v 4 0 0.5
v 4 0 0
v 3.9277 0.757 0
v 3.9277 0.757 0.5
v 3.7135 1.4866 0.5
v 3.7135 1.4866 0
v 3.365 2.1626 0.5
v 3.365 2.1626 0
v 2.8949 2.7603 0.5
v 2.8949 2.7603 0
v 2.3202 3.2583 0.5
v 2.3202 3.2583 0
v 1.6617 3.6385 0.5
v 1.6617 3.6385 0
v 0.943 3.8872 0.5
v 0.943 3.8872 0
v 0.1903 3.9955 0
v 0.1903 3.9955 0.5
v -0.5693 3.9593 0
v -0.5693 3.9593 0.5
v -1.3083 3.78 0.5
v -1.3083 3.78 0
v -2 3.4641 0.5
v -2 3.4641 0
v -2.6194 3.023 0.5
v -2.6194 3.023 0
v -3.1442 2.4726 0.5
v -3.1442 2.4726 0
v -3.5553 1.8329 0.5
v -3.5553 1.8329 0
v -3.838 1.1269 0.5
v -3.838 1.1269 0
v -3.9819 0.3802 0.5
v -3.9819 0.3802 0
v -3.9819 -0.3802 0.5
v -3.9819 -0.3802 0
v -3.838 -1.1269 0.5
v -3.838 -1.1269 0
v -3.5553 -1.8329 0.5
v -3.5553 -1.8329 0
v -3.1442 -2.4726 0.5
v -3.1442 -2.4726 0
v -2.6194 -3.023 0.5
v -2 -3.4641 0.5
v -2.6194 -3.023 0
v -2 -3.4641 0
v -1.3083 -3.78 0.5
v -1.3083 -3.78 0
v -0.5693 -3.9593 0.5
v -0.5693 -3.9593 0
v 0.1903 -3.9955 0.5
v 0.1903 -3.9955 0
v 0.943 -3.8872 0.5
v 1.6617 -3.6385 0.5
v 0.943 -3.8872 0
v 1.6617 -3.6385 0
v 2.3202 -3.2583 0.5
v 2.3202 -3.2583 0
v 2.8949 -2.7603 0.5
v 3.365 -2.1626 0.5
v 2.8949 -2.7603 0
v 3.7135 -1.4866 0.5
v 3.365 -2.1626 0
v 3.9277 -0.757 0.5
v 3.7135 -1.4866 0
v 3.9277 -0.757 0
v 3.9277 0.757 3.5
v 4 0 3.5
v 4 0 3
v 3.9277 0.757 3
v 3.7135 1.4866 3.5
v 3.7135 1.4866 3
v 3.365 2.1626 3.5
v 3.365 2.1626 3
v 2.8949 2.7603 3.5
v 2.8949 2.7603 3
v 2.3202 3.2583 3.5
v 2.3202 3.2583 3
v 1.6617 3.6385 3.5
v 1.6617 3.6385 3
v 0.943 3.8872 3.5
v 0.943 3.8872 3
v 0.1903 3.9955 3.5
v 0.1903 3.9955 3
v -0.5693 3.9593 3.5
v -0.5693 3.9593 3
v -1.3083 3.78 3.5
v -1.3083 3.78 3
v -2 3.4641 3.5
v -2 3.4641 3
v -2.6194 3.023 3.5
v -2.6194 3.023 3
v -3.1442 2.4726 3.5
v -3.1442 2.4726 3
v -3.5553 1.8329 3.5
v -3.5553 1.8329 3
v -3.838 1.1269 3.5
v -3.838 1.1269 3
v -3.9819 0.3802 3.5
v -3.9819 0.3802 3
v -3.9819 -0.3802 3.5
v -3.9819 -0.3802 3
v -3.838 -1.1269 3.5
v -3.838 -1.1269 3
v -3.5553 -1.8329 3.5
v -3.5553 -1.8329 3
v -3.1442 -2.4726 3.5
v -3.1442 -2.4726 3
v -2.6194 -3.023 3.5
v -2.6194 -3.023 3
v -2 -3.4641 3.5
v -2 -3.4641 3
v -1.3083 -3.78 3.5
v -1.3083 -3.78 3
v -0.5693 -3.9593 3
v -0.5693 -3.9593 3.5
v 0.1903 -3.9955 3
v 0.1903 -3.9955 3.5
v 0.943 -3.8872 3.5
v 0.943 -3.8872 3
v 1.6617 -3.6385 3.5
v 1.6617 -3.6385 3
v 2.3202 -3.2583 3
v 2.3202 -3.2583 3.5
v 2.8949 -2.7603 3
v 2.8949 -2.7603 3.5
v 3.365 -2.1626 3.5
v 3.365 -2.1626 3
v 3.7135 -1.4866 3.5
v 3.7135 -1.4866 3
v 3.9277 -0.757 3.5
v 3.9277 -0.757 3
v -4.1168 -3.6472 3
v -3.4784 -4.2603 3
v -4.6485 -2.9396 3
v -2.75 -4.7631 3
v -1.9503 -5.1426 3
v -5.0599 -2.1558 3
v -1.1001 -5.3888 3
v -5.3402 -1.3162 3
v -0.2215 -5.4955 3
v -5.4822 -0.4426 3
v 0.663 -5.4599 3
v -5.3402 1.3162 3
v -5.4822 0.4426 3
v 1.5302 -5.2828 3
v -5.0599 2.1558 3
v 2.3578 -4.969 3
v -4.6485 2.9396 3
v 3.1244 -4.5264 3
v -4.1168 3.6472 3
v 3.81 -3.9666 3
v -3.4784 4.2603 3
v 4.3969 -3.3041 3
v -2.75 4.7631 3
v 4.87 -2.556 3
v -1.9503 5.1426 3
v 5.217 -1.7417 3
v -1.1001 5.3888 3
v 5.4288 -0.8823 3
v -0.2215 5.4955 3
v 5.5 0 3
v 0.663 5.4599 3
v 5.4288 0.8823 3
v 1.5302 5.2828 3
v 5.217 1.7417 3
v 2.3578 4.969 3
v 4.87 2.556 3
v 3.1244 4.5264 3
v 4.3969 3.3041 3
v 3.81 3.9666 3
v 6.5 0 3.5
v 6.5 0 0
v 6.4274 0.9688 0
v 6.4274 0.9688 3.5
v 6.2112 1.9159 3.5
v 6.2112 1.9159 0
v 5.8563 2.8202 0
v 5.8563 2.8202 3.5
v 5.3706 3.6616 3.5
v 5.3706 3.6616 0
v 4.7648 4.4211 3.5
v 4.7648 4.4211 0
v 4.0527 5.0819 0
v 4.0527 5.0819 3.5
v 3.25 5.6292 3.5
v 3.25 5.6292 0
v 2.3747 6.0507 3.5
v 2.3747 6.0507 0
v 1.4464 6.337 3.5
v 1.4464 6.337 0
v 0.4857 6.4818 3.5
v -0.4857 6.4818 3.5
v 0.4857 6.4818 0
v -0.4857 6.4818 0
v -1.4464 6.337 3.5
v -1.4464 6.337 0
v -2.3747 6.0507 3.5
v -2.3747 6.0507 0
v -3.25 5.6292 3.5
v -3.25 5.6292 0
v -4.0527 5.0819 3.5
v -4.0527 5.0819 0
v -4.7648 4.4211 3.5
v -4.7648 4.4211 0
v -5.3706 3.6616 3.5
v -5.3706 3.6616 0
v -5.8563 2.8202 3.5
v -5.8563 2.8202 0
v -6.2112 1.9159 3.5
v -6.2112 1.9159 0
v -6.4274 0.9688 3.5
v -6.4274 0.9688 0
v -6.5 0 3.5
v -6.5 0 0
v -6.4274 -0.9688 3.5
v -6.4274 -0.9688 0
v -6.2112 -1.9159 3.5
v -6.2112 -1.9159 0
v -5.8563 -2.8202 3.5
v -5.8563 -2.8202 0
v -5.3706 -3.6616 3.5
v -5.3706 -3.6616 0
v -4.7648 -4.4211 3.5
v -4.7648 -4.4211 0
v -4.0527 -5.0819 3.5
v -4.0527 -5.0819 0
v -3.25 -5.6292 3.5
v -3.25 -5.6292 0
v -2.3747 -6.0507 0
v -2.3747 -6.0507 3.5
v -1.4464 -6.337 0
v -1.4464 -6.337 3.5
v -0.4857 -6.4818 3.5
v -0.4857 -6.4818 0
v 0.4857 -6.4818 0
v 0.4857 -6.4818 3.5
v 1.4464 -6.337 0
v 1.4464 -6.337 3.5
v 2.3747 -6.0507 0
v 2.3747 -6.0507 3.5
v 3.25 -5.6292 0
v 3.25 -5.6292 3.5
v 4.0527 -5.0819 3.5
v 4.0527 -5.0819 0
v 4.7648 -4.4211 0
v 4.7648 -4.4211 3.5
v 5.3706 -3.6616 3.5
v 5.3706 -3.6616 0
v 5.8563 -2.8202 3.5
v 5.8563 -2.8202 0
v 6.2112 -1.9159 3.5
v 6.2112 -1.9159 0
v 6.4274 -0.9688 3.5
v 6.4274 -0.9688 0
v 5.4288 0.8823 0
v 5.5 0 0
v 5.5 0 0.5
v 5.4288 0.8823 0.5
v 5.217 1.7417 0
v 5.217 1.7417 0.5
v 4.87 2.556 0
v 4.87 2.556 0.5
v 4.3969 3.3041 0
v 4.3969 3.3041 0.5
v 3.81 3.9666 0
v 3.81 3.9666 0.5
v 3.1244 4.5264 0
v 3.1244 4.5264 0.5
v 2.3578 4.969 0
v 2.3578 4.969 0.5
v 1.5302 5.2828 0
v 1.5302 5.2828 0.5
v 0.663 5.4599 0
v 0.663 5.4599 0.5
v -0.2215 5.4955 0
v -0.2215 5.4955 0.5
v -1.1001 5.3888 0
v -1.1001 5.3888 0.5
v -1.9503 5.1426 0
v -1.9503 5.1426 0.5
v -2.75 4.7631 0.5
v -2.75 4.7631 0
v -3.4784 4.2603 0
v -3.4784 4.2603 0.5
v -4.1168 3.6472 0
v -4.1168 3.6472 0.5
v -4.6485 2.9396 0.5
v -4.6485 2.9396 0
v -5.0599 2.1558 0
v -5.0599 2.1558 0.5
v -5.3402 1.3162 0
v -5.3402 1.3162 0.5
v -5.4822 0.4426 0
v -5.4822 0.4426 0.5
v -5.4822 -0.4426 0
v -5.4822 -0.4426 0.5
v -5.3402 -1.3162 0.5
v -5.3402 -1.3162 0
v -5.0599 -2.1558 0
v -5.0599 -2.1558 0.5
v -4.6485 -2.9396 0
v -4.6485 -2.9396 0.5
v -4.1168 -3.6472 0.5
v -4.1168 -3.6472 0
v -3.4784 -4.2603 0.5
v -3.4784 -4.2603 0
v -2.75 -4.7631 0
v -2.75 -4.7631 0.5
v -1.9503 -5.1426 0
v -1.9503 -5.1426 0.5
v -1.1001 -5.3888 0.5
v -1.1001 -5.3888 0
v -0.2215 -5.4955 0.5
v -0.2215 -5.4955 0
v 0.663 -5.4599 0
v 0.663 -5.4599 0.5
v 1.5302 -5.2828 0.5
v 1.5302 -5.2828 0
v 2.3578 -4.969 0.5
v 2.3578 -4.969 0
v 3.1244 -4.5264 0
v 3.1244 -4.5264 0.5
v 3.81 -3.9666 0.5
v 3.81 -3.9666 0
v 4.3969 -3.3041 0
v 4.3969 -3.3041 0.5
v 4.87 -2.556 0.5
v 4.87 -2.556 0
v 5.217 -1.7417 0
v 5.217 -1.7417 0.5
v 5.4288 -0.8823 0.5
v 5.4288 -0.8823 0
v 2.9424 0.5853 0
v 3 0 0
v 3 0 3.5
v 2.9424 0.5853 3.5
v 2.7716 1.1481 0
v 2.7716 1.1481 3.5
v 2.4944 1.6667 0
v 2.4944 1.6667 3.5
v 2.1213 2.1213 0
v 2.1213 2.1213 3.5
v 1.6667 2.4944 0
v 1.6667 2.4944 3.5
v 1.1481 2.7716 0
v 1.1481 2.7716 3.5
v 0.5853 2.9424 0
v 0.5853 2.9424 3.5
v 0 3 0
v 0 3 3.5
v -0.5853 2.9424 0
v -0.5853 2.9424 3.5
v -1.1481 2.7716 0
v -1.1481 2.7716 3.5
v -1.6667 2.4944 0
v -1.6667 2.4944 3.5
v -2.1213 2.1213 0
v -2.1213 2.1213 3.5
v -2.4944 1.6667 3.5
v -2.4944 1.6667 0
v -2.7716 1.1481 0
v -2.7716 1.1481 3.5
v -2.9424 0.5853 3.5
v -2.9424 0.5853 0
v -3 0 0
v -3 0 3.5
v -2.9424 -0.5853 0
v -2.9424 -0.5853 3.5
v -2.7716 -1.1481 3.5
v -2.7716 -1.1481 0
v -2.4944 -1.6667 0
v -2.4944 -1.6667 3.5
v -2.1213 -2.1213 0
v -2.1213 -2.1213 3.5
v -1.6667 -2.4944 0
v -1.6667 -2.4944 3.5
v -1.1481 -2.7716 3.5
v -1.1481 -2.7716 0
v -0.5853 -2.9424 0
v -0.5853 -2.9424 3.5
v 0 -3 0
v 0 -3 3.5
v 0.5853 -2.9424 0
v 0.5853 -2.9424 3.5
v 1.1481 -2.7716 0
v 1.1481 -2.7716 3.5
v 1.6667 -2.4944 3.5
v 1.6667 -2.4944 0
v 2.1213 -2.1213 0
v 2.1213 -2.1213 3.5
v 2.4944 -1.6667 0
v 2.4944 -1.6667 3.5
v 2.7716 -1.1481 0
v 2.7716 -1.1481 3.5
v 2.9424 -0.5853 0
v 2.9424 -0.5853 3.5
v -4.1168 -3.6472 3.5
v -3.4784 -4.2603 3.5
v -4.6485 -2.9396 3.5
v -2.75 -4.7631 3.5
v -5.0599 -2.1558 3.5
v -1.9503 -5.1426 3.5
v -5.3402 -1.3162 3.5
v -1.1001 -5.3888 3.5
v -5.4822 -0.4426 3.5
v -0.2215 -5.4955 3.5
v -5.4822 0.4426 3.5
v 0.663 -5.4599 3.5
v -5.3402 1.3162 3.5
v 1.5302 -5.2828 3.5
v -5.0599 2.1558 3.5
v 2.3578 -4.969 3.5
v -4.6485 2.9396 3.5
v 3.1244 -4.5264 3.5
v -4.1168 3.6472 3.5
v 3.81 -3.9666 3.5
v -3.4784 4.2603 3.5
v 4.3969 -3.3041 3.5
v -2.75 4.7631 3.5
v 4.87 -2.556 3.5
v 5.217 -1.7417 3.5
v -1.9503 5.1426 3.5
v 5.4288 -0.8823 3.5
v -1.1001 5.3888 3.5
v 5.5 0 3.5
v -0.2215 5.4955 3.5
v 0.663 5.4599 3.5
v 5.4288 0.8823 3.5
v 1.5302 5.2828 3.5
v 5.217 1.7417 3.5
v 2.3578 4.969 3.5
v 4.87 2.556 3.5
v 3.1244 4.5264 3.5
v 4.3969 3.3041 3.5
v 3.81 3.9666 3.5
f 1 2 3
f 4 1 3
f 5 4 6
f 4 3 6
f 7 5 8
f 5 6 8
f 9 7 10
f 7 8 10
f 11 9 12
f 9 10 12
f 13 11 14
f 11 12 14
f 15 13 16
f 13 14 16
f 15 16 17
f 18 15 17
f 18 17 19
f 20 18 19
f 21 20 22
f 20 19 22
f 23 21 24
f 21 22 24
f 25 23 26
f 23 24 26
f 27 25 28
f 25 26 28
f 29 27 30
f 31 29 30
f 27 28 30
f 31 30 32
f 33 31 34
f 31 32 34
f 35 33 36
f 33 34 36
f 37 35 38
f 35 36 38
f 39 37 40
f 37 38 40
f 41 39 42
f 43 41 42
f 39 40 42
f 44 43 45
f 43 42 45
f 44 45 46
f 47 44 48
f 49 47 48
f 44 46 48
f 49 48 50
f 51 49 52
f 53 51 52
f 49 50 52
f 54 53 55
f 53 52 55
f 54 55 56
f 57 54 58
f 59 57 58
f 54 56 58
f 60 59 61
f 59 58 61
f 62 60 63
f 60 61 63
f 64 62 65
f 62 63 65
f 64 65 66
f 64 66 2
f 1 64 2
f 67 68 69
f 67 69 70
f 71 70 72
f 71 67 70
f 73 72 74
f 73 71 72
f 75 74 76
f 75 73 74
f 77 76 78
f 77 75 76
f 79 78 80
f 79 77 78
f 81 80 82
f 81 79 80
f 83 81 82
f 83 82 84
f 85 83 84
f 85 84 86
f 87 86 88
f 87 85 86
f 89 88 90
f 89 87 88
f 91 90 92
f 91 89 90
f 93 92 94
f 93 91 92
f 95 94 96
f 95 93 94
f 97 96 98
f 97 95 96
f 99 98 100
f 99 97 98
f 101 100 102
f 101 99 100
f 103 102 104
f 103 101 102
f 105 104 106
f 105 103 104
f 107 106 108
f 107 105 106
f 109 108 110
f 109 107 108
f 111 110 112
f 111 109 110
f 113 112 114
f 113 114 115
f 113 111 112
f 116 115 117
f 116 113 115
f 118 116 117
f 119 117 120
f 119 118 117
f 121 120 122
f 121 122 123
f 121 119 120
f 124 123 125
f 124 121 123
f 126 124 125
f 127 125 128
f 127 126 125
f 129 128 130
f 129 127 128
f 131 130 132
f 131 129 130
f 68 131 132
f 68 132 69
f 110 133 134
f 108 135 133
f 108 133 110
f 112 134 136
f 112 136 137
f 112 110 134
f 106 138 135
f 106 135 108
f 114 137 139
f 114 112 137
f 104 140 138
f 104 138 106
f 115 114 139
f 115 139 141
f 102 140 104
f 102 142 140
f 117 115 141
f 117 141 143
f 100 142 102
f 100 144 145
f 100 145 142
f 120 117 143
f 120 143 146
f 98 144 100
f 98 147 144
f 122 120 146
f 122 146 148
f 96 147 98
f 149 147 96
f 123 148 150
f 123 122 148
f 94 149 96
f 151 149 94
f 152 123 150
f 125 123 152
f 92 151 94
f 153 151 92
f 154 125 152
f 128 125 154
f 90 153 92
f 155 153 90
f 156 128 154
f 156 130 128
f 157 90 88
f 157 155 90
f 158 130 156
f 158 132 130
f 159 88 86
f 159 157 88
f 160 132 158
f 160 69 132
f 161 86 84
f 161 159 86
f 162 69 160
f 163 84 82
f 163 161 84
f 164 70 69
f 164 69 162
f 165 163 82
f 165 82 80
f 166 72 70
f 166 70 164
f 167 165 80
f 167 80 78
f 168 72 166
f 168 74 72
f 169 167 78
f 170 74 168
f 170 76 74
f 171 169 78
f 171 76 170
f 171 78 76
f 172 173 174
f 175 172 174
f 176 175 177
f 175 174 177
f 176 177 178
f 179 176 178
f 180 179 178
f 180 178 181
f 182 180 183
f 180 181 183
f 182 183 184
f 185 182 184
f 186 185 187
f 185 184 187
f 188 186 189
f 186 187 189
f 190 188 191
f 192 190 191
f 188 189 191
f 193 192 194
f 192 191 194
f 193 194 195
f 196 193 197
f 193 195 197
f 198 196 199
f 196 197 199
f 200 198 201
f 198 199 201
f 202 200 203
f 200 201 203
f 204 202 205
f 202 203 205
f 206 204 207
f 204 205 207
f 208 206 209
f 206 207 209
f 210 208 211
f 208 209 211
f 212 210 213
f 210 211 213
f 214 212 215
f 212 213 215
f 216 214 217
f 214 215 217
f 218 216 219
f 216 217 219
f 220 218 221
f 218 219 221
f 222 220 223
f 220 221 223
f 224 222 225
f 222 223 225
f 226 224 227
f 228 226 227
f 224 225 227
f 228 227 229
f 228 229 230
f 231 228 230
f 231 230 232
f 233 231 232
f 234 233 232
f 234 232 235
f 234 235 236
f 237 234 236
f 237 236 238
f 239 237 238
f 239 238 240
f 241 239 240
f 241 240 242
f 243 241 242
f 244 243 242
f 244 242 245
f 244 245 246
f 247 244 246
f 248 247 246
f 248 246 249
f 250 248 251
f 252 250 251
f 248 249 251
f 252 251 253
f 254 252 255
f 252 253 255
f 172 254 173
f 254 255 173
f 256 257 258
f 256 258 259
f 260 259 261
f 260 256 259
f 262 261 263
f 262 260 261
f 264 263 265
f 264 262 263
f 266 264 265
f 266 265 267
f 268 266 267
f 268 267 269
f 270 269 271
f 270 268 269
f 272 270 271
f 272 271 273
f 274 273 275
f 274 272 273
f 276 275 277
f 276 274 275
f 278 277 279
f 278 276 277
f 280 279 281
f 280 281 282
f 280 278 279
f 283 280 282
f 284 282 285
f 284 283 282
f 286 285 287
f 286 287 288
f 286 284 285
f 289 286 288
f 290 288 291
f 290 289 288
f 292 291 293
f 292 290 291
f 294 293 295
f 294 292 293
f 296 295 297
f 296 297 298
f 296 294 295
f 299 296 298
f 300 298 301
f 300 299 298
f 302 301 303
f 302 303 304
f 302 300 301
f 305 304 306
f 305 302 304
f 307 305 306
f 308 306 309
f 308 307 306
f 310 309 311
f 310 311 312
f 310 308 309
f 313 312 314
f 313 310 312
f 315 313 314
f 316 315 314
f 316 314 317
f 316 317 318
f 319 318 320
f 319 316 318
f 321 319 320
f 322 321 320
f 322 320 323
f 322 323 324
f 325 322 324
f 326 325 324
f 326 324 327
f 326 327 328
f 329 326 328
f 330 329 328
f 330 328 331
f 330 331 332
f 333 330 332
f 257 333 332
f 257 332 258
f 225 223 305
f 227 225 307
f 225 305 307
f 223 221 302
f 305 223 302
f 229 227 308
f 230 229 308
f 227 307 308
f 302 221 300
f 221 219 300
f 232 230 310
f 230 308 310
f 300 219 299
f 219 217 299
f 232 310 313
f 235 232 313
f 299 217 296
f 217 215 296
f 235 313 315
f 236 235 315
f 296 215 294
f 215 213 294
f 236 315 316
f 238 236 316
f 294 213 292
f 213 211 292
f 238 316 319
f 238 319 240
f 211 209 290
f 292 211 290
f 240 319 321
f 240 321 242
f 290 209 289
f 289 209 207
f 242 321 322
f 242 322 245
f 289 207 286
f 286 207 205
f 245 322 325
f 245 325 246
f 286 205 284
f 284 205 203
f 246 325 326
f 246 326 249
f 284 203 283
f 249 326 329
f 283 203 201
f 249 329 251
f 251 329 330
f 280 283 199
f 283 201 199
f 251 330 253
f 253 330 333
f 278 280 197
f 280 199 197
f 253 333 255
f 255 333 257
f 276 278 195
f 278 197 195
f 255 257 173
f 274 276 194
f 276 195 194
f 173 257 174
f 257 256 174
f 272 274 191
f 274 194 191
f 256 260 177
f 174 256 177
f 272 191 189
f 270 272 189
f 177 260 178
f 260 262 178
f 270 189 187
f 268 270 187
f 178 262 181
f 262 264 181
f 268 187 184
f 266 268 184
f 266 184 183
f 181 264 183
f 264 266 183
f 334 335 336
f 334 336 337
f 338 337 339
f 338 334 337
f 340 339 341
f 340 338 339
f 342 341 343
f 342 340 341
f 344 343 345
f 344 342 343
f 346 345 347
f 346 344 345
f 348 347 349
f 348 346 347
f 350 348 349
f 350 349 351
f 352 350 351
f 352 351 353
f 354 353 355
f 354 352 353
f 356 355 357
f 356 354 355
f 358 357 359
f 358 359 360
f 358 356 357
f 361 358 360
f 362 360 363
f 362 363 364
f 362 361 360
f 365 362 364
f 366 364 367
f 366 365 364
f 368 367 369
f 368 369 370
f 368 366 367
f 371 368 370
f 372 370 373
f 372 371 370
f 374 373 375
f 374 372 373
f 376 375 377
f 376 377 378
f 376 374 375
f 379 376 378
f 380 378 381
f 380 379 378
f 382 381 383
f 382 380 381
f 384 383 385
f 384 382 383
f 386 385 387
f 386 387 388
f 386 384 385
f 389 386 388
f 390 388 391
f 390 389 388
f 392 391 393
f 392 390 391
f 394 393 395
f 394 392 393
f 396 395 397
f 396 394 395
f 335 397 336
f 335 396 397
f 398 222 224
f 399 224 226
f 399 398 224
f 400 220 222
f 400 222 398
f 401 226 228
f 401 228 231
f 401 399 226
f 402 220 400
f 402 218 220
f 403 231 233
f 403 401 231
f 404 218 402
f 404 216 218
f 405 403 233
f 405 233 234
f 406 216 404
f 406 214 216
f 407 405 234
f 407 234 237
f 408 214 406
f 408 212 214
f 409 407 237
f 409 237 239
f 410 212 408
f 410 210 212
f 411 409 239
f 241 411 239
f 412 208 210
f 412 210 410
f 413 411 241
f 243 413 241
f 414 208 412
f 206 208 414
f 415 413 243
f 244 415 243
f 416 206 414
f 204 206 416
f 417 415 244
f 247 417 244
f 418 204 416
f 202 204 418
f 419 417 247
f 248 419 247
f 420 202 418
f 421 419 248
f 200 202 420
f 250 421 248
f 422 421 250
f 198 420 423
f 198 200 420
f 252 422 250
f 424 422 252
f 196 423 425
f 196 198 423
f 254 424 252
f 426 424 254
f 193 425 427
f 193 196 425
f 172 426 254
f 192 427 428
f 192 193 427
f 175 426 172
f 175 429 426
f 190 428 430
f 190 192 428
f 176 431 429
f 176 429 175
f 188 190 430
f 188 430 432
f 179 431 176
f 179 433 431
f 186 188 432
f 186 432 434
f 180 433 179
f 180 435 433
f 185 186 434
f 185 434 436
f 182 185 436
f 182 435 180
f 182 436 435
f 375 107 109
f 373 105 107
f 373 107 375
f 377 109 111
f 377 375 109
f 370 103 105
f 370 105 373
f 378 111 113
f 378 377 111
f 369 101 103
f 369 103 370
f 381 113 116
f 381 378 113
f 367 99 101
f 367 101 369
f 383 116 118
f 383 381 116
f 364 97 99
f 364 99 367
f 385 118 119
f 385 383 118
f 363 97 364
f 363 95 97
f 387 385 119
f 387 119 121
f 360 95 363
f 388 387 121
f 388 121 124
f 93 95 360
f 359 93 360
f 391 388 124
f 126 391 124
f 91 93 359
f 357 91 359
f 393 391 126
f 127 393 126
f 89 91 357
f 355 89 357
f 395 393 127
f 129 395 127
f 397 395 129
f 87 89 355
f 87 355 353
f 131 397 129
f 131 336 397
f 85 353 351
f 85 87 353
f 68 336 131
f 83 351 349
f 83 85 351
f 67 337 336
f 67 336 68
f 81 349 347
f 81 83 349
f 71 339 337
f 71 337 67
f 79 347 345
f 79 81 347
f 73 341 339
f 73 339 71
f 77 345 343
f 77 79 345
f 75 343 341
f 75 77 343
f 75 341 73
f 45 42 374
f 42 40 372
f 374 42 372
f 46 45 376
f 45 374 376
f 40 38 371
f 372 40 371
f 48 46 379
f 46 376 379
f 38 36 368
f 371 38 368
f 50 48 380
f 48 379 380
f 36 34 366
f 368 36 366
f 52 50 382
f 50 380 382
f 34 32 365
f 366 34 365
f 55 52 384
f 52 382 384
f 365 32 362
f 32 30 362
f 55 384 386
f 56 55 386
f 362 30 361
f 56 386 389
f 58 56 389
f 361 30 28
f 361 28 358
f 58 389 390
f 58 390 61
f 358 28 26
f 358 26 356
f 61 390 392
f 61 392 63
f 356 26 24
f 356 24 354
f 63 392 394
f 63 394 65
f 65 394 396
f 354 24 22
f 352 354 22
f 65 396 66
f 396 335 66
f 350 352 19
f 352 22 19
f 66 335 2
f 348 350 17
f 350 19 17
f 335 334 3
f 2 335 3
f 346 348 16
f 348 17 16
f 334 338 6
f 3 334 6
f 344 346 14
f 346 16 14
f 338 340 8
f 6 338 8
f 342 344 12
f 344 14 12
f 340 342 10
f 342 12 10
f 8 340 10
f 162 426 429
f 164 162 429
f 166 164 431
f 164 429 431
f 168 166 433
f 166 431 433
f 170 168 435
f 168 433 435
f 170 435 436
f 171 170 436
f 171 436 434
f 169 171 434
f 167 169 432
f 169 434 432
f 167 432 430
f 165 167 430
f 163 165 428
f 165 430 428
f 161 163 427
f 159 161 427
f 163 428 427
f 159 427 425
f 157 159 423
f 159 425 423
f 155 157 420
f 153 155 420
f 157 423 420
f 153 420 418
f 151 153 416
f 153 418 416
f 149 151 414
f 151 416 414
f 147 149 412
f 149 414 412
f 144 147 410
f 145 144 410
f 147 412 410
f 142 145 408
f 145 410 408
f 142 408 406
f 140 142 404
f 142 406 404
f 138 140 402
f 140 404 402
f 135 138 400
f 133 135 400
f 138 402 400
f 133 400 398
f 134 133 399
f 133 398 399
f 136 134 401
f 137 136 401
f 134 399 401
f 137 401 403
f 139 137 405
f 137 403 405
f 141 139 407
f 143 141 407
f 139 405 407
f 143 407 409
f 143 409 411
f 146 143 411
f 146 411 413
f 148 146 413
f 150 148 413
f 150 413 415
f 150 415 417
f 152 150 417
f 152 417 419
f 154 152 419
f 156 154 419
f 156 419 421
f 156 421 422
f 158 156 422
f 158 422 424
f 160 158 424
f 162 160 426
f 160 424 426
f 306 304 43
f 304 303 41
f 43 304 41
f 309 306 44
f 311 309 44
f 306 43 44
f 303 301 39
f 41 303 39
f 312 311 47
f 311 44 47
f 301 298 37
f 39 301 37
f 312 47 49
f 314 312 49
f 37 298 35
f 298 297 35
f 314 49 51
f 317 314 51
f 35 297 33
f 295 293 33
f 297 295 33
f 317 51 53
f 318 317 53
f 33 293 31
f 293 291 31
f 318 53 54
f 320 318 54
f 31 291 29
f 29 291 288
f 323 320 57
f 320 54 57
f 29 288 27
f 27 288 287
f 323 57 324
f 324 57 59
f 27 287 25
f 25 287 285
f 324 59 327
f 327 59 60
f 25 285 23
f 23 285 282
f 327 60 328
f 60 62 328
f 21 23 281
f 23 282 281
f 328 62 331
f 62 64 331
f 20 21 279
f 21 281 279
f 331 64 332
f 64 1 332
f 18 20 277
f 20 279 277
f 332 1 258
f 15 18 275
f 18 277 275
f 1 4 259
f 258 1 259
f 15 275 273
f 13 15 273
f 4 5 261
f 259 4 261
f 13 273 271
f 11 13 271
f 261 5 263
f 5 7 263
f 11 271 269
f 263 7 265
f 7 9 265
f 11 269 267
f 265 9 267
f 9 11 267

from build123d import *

# Parameters (mm, degrees)
SKETCH048_R     = 6.5
SKETCH048_R_2   = 3
PAD021_DEPTH    = 3.5
SKETCH049_R     = 5.5
SKETCH049_R_2   = 4
POCKET027_DEPTH = 0.5
SKETCH050_R     = 5.5
SKETCH050_R_2   = 4
POCKET028_DEPTH = 0.5


with BuildPart() as part:
    # Sketch048 → Pad021 (new body)
    with BuildSketch(Plane.XY):
        Circle(SKETCH048_R)
        Circle(SKETCH048_R_2, mode=Mode.SUBTRACT)
    extrude(amount=PAD021_DEPTH)

    # Sketch049 → Pocket027 (cut)
    with BuildSketch(Plane.XY.offset(3.5)):
        Circle(SKETCH049_R)
        Circle(SKETCH049_R_2, mode=Mode.SUBTRACT)
    extrude(amount=-POCKET027_DEPTH, mode=Mode.SUBTRACT)

    # Sketch050 → Pocket028 (cut)
    with BuildSketch(Plane.XY):
        Circle(SKETCH050_R)
        Circle(SKETCH050_R_2, mode=Mode.SUBTRACT)
    extrude(amount=POCKET028_DEPTH, mode=Mode.SUBTRACT)


solid = part.part
